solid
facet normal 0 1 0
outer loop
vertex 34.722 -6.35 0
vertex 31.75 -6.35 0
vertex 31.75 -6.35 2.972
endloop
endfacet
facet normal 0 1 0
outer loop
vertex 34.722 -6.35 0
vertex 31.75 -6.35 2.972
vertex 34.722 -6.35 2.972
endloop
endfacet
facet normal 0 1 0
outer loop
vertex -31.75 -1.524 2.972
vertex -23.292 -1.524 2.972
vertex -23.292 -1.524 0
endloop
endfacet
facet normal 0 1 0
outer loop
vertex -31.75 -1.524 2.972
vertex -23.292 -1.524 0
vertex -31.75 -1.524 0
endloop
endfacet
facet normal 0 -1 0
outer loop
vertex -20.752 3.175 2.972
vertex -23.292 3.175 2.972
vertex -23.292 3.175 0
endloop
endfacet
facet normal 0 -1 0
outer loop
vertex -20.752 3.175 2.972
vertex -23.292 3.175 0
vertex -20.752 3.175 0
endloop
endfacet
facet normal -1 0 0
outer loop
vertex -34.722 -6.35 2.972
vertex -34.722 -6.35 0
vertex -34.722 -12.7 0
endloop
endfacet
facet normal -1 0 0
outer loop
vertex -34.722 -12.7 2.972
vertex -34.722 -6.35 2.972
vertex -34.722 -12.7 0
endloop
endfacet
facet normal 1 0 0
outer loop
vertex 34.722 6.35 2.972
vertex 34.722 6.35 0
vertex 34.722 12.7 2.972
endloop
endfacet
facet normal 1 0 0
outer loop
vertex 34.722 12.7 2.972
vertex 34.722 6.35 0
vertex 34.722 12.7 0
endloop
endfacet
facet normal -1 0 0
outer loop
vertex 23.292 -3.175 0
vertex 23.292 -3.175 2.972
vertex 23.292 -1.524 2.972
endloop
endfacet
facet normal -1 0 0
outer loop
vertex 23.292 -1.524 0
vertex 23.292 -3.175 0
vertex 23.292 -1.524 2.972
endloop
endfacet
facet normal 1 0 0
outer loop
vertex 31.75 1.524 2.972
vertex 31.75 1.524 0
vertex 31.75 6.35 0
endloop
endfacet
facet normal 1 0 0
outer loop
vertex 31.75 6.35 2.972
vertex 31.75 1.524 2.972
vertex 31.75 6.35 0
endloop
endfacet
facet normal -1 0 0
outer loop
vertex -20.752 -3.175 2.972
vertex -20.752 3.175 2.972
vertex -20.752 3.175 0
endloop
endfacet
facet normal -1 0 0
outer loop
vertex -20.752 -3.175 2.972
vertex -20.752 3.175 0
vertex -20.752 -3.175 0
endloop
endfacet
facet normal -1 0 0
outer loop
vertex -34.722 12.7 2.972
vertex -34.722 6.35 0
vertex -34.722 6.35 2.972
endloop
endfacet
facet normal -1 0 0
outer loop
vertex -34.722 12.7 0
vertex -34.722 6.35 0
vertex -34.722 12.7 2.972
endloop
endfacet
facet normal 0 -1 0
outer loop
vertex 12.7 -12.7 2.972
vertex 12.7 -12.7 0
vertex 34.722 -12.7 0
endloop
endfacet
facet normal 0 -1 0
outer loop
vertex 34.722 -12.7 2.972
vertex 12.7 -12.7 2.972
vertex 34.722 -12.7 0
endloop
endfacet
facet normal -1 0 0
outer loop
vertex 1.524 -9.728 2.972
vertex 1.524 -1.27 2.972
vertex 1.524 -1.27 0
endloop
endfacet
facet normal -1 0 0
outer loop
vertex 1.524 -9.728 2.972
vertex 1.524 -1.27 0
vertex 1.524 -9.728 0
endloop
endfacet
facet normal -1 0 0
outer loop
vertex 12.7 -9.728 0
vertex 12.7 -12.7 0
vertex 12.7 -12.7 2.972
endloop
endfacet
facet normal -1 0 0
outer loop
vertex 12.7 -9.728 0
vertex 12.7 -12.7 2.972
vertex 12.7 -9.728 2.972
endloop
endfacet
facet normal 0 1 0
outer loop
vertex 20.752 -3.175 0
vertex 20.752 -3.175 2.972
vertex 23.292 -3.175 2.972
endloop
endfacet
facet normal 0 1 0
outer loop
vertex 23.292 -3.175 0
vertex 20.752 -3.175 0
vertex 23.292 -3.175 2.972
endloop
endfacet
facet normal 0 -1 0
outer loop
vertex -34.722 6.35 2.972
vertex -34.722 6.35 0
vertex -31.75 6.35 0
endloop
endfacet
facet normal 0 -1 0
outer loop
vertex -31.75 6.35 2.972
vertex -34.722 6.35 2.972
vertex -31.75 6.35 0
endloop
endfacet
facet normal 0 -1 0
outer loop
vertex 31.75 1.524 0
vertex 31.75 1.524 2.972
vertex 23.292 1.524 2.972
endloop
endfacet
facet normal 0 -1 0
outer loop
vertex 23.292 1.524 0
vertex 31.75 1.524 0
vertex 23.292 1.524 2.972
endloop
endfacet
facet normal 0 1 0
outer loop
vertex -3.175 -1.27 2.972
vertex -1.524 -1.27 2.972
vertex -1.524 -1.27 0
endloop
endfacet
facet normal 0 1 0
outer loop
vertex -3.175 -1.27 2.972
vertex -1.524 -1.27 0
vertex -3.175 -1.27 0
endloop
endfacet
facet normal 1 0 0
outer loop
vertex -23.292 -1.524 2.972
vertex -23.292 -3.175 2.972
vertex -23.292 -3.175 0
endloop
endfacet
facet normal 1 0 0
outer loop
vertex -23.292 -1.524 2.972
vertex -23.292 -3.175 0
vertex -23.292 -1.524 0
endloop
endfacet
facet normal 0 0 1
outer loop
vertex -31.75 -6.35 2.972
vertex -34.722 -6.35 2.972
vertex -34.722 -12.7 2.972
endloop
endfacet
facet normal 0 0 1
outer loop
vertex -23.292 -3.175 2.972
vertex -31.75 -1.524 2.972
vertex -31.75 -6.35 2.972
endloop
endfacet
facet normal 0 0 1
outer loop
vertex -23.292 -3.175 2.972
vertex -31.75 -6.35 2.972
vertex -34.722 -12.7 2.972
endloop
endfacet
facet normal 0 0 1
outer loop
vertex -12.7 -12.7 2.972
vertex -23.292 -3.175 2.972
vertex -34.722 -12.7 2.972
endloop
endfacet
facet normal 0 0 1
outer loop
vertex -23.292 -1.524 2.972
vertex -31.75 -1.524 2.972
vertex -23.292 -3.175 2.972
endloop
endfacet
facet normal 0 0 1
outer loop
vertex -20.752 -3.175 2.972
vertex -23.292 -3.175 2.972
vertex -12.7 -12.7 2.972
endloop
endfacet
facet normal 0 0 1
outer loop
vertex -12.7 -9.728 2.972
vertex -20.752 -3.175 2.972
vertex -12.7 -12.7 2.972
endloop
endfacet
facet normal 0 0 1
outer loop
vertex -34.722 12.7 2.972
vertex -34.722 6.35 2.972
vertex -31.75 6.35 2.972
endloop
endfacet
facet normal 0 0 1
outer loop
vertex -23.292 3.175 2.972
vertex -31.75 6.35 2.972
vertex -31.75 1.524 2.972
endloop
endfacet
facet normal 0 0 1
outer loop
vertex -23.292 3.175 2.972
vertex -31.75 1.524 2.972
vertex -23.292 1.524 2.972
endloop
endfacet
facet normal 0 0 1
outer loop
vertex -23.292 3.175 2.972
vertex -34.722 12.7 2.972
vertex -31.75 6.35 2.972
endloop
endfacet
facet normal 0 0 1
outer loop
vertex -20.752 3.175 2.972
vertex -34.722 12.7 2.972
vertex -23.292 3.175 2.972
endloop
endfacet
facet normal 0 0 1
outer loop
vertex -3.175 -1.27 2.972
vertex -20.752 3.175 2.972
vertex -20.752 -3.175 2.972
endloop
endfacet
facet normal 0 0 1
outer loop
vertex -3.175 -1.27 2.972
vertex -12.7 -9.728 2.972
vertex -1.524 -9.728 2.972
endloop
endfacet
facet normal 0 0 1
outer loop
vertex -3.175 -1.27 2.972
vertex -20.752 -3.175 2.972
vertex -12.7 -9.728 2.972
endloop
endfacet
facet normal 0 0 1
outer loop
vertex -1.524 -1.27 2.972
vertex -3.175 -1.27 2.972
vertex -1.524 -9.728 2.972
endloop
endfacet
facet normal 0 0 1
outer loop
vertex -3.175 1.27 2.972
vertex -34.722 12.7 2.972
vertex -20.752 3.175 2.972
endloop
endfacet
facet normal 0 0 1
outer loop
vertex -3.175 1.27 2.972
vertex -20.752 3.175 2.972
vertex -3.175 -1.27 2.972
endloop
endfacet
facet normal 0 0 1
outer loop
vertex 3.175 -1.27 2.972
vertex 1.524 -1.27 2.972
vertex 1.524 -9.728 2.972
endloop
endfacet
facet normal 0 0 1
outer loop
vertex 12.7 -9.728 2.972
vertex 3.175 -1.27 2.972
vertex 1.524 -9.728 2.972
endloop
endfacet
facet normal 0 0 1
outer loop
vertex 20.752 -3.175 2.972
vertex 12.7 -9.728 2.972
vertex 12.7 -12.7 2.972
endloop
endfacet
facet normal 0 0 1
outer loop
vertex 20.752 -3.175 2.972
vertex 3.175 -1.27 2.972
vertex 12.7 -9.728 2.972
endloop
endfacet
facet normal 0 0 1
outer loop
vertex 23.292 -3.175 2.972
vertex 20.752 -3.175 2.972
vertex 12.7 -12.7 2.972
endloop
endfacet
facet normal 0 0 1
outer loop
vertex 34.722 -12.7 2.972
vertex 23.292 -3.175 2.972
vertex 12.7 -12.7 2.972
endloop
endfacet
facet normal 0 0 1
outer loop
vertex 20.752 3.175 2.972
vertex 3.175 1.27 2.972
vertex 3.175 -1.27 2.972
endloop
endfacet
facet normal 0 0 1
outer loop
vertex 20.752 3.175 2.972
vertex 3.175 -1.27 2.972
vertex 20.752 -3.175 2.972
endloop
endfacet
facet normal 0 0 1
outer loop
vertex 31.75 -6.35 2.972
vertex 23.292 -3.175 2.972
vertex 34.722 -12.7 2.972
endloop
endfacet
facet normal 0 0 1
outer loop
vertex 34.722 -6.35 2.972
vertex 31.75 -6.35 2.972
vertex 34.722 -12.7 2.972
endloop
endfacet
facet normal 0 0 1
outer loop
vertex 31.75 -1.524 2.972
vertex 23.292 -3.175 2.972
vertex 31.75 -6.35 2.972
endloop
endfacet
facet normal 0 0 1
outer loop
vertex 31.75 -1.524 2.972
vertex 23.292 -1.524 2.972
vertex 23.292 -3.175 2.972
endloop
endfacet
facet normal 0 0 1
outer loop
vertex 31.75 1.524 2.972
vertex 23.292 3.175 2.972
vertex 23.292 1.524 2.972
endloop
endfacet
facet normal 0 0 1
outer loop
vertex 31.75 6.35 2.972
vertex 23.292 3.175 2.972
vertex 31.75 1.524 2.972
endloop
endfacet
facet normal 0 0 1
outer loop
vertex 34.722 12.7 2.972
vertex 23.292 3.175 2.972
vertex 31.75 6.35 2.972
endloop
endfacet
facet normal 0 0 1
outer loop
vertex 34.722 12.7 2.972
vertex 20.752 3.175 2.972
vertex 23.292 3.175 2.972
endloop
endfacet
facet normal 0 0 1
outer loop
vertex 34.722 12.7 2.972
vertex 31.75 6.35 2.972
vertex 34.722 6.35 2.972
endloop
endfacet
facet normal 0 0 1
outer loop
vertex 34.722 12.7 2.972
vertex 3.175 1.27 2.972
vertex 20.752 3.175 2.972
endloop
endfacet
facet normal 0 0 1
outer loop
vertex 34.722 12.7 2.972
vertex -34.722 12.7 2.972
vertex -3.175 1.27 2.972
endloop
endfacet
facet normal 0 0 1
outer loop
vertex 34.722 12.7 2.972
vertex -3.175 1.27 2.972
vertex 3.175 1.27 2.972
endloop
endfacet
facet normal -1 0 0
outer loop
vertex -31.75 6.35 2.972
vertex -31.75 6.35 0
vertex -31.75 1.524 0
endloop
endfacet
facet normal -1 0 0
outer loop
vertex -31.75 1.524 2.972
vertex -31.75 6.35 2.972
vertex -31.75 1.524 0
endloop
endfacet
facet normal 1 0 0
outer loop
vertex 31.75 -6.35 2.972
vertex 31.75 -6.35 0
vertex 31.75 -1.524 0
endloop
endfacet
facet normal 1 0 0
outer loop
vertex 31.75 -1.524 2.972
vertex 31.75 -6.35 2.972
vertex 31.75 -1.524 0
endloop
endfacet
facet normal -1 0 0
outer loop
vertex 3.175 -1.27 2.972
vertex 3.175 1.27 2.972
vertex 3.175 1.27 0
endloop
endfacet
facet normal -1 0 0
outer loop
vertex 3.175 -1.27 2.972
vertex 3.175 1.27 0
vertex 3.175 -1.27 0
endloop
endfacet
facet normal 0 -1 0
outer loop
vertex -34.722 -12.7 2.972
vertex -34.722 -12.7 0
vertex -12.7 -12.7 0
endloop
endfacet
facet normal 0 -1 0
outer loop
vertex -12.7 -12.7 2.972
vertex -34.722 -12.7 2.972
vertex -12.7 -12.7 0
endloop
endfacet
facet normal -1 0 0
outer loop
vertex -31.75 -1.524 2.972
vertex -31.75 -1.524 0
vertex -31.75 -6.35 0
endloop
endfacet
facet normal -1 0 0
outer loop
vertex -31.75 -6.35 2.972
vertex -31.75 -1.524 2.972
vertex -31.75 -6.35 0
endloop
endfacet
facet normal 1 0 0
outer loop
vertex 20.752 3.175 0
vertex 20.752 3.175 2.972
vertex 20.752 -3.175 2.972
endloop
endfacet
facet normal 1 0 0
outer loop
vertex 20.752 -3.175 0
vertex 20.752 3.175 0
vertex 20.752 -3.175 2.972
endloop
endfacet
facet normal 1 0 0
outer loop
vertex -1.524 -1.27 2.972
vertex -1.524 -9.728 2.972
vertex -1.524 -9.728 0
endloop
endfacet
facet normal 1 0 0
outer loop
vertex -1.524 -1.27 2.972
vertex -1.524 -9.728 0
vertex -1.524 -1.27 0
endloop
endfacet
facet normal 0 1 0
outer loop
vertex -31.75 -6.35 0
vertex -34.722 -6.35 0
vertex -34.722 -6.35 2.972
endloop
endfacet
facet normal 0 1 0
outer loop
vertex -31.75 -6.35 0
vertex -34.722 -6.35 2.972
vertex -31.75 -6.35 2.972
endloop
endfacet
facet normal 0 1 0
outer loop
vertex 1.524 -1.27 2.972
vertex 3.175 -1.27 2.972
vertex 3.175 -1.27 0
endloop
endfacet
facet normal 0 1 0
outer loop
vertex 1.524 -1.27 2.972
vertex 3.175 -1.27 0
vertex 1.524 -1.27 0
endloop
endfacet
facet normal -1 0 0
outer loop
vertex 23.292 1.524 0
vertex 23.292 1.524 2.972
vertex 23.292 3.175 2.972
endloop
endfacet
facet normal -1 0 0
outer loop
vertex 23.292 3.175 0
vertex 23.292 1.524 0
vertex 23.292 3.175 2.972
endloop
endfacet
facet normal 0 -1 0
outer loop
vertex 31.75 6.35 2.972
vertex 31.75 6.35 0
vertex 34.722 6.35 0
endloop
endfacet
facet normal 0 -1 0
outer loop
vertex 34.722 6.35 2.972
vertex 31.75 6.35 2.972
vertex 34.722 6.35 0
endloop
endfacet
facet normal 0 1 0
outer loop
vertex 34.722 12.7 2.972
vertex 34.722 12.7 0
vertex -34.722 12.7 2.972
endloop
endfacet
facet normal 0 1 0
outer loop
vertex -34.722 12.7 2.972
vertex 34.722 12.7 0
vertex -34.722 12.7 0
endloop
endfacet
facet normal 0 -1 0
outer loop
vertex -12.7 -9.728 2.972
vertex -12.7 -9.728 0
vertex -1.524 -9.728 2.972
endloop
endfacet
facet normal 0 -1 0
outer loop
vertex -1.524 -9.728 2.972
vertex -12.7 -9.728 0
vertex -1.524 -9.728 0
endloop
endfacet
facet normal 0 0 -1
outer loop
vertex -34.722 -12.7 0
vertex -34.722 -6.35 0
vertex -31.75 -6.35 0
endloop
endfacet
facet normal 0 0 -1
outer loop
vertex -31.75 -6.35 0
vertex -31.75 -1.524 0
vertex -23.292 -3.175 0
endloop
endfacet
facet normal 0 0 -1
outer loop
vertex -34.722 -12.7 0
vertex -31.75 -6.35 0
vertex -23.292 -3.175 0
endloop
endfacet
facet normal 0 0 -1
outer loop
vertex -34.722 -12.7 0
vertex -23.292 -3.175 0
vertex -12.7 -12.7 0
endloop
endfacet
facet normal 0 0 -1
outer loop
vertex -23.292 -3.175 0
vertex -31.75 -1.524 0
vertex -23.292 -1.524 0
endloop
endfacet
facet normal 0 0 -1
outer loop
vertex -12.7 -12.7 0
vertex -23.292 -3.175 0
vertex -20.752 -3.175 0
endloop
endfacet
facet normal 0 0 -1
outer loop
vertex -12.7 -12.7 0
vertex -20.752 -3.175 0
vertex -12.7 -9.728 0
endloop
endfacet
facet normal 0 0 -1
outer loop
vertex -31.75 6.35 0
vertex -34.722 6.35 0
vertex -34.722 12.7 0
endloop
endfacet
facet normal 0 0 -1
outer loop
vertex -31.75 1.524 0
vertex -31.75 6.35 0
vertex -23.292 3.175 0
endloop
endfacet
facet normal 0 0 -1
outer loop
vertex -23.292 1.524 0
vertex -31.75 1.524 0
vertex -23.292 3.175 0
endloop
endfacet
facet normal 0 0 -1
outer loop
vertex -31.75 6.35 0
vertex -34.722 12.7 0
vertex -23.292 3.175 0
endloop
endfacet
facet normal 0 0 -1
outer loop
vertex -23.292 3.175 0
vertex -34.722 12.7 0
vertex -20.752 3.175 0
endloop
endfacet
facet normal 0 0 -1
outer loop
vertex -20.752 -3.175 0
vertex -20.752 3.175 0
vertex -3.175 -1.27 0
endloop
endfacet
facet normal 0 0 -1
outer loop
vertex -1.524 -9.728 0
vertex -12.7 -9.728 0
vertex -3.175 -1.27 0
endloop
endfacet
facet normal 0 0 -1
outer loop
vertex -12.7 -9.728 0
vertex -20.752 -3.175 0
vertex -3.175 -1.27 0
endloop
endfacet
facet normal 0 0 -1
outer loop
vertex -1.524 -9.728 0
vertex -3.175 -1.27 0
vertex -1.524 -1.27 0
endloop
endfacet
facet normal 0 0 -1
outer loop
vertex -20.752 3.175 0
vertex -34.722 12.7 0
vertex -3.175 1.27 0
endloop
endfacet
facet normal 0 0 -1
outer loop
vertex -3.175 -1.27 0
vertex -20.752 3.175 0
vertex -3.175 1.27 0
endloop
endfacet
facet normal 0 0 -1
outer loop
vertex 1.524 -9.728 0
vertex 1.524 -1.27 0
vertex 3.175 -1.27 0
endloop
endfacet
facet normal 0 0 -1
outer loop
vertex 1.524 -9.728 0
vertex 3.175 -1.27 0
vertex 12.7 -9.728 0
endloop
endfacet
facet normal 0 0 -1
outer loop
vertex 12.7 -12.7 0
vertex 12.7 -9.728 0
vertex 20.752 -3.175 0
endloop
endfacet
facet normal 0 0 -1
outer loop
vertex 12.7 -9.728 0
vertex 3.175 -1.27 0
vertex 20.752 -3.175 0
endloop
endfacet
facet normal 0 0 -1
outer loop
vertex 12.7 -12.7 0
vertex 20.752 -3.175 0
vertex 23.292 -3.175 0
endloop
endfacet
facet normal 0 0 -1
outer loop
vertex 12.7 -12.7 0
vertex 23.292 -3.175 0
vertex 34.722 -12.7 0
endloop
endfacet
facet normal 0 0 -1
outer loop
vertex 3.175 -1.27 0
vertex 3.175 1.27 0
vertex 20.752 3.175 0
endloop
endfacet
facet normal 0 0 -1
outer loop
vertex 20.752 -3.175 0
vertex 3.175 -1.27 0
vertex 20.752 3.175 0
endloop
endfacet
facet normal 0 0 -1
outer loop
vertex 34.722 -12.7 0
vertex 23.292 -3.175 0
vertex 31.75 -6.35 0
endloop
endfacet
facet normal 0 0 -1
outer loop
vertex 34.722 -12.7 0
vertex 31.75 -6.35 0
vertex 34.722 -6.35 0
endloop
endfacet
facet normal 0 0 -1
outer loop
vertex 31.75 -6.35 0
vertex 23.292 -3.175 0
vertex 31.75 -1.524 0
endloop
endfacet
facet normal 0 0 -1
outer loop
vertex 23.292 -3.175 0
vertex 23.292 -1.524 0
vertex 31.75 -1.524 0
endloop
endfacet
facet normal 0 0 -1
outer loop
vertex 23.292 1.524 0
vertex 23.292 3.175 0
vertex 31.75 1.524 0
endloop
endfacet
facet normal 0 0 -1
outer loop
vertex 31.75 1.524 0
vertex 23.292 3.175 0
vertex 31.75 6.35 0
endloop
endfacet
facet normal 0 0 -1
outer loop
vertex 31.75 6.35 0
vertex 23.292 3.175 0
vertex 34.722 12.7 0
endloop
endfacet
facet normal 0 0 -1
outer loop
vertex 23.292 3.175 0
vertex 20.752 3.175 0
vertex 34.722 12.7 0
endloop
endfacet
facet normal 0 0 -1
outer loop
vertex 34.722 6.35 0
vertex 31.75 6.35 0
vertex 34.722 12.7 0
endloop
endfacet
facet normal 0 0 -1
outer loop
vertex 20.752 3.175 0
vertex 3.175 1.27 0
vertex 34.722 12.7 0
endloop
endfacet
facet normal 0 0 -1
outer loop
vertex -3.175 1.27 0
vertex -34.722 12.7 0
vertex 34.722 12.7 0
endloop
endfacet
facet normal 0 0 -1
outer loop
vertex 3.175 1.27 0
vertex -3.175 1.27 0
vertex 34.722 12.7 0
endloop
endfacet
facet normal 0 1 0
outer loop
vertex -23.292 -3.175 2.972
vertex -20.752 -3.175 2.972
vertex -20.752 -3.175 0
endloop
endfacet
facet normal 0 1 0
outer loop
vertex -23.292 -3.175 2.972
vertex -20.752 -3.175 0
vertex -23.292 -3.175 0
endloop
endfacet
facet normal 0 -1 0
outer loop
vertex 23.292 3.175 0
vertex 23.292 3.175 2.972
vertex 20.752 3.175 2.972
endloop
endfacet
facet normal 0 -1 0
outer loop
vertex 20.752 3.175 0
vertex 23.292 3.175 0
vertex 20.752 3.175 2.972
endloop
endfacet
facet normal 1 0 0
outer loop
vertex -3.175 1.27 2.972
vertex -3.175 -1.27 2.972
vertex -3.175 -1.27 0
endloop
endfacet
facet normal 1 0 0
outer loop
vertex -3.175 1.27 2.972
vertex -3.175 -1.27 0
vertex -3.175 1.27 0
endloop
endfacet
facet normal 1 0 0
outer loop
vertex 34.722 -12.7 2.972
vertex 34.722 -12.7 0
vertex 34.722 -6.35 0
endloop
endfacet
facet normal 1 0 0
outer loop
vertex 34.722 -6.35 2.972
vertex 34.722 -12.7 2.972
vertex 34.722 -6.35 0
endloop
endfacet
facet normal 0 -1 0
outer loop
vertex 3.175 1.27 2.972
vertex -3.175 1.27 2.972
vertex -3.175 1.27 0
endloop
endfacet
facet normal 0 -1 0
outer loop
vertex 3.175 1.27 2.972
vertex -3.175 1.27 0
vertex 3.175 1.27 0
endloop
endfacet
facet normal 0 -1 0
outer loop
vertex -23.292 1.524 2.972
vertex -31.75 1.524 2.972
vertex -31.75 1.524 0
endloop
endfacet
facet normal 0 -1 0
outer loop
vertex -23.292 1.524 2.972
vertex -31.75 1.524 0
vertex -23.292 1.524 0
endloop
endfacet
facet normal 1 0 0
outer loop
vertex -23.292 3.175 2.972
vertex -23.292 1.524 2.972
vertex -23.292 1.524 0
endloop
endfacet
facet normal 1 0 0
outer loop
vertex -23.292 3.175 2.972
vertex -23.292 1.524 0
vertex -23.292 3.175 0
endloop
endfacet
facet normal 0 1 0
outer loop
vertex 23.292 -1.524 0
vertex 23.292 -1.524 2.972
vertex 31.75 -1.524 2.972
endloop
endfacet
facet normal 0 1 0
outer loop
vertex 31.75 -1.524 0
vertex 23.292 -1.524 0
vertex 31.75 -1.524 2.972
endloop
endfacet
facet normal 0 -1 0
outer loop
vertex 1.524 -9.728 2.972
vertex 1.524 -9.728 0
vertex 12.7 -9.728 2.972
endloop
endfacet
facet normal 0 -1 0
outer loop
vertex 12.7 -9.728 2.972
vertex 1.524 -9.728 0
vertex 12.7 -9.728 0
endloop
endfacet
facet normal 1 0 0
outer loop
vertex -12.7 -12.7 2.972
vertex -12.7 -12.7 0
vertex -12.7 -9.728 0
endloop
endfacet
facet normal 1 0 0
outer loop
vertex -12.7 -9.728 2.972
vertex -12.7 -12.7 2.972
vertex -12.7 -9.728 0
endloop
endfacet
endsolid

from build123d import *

# Parameters (mm, degrees)
SKETCH1_W           = 2.9718
SKETCH1_H           = 6.35
SKETCH1_H_2         = 3.3782
SKETCH1_H_3         = 2.9718
SKETCH1_W_2         = 19.05
BOSS_EXTRUDE1_DEPTH = 2.9718
CUT_EXTRUDE1_DEPTH  = 3.9718


with BuildPart() as part:
    # Sketch1 → Boss-Extrude1 (new body)
    with BuildSketch(Plane.XY):
        Polygon((-31.75, -6.35), (-31.75, -9.7282), (-12.7, -9.7282), (12.7, -9.7282), (31.75, -9.7282), (31.75, -6.35), (31.75, 6.35), (31.75, 12.7), (-31.75, 12.7), (-31.75, 6.35), align=None)
        with Locations((-33.2359, 9.525)):
            Rectangle(SKETCH1_W, SKETCH1_H)
        with Locations((-33.2359, -8.0391)):
            Rectangle(SKETCH1_W, SKETCH1_H_2)
        with Locations((-33.2359, -11.2141)):
            Rectangle(SKETCH1_W, SKETCH1_H_3)
        with Locations((-22.225, -11.2141)):
            Rectangle(SKETCH1_W_2, SKETCH1_H_3)
        with Locations((22.225, -11.2141)):
            Rectangle(SKETCH1_W_2, SKETCH1_H_3)
        with Locations((33.2359, -8.0391)):
            Rectangle(SKETCH1_W, SKETCH1_H_2)
        with Locations((33.2359, -11.2141)):
            Rectangle(SKETCH1_W, SKETCH1_H_3)
        with Locations((33.2359, 9.525)):
            Rectangle(SKETCH1_W, SKETCH1_H)
    extrude(amount=BOSS_EXTRUDE1_DEPTH)

    # Sketch2 → Cut-Extrude1 (cut, through all)
    with BuildSketch(Plane.XY.offset(2.9718)):
        Polygon((-20.7518, 3.175), (-20.7518, -3.175), (-23.2918, -3.175), (-23.2918, -1.524), (-31.75, -1.524), (-31.75, 1.524), (-23.2918, 1.524), (-23.2918, 3.175), align=None)
        Polygon((-3.175, 1.27), (3.175, 1.27), (3.175, -1.27), (1.524, -1.27), (1.524, -9.7282), (-1.524, -9.7282), (-1.524, -1.27), (-3.175, -1.27), align=None)
        Polygon((20.7518, 3.175), (20.7518, -3.175), (23.2918, -3.175), (23.2918, -1.524), (31.75, -1.524), (31.75, 1.524), (23.2918, 1.524), (23.2918, 3.175), align=None)
    extrude(amount=-CUT_EXTRUDE1_DEPTH, mode=Mode.SUBTRACT)


solid = part.part
